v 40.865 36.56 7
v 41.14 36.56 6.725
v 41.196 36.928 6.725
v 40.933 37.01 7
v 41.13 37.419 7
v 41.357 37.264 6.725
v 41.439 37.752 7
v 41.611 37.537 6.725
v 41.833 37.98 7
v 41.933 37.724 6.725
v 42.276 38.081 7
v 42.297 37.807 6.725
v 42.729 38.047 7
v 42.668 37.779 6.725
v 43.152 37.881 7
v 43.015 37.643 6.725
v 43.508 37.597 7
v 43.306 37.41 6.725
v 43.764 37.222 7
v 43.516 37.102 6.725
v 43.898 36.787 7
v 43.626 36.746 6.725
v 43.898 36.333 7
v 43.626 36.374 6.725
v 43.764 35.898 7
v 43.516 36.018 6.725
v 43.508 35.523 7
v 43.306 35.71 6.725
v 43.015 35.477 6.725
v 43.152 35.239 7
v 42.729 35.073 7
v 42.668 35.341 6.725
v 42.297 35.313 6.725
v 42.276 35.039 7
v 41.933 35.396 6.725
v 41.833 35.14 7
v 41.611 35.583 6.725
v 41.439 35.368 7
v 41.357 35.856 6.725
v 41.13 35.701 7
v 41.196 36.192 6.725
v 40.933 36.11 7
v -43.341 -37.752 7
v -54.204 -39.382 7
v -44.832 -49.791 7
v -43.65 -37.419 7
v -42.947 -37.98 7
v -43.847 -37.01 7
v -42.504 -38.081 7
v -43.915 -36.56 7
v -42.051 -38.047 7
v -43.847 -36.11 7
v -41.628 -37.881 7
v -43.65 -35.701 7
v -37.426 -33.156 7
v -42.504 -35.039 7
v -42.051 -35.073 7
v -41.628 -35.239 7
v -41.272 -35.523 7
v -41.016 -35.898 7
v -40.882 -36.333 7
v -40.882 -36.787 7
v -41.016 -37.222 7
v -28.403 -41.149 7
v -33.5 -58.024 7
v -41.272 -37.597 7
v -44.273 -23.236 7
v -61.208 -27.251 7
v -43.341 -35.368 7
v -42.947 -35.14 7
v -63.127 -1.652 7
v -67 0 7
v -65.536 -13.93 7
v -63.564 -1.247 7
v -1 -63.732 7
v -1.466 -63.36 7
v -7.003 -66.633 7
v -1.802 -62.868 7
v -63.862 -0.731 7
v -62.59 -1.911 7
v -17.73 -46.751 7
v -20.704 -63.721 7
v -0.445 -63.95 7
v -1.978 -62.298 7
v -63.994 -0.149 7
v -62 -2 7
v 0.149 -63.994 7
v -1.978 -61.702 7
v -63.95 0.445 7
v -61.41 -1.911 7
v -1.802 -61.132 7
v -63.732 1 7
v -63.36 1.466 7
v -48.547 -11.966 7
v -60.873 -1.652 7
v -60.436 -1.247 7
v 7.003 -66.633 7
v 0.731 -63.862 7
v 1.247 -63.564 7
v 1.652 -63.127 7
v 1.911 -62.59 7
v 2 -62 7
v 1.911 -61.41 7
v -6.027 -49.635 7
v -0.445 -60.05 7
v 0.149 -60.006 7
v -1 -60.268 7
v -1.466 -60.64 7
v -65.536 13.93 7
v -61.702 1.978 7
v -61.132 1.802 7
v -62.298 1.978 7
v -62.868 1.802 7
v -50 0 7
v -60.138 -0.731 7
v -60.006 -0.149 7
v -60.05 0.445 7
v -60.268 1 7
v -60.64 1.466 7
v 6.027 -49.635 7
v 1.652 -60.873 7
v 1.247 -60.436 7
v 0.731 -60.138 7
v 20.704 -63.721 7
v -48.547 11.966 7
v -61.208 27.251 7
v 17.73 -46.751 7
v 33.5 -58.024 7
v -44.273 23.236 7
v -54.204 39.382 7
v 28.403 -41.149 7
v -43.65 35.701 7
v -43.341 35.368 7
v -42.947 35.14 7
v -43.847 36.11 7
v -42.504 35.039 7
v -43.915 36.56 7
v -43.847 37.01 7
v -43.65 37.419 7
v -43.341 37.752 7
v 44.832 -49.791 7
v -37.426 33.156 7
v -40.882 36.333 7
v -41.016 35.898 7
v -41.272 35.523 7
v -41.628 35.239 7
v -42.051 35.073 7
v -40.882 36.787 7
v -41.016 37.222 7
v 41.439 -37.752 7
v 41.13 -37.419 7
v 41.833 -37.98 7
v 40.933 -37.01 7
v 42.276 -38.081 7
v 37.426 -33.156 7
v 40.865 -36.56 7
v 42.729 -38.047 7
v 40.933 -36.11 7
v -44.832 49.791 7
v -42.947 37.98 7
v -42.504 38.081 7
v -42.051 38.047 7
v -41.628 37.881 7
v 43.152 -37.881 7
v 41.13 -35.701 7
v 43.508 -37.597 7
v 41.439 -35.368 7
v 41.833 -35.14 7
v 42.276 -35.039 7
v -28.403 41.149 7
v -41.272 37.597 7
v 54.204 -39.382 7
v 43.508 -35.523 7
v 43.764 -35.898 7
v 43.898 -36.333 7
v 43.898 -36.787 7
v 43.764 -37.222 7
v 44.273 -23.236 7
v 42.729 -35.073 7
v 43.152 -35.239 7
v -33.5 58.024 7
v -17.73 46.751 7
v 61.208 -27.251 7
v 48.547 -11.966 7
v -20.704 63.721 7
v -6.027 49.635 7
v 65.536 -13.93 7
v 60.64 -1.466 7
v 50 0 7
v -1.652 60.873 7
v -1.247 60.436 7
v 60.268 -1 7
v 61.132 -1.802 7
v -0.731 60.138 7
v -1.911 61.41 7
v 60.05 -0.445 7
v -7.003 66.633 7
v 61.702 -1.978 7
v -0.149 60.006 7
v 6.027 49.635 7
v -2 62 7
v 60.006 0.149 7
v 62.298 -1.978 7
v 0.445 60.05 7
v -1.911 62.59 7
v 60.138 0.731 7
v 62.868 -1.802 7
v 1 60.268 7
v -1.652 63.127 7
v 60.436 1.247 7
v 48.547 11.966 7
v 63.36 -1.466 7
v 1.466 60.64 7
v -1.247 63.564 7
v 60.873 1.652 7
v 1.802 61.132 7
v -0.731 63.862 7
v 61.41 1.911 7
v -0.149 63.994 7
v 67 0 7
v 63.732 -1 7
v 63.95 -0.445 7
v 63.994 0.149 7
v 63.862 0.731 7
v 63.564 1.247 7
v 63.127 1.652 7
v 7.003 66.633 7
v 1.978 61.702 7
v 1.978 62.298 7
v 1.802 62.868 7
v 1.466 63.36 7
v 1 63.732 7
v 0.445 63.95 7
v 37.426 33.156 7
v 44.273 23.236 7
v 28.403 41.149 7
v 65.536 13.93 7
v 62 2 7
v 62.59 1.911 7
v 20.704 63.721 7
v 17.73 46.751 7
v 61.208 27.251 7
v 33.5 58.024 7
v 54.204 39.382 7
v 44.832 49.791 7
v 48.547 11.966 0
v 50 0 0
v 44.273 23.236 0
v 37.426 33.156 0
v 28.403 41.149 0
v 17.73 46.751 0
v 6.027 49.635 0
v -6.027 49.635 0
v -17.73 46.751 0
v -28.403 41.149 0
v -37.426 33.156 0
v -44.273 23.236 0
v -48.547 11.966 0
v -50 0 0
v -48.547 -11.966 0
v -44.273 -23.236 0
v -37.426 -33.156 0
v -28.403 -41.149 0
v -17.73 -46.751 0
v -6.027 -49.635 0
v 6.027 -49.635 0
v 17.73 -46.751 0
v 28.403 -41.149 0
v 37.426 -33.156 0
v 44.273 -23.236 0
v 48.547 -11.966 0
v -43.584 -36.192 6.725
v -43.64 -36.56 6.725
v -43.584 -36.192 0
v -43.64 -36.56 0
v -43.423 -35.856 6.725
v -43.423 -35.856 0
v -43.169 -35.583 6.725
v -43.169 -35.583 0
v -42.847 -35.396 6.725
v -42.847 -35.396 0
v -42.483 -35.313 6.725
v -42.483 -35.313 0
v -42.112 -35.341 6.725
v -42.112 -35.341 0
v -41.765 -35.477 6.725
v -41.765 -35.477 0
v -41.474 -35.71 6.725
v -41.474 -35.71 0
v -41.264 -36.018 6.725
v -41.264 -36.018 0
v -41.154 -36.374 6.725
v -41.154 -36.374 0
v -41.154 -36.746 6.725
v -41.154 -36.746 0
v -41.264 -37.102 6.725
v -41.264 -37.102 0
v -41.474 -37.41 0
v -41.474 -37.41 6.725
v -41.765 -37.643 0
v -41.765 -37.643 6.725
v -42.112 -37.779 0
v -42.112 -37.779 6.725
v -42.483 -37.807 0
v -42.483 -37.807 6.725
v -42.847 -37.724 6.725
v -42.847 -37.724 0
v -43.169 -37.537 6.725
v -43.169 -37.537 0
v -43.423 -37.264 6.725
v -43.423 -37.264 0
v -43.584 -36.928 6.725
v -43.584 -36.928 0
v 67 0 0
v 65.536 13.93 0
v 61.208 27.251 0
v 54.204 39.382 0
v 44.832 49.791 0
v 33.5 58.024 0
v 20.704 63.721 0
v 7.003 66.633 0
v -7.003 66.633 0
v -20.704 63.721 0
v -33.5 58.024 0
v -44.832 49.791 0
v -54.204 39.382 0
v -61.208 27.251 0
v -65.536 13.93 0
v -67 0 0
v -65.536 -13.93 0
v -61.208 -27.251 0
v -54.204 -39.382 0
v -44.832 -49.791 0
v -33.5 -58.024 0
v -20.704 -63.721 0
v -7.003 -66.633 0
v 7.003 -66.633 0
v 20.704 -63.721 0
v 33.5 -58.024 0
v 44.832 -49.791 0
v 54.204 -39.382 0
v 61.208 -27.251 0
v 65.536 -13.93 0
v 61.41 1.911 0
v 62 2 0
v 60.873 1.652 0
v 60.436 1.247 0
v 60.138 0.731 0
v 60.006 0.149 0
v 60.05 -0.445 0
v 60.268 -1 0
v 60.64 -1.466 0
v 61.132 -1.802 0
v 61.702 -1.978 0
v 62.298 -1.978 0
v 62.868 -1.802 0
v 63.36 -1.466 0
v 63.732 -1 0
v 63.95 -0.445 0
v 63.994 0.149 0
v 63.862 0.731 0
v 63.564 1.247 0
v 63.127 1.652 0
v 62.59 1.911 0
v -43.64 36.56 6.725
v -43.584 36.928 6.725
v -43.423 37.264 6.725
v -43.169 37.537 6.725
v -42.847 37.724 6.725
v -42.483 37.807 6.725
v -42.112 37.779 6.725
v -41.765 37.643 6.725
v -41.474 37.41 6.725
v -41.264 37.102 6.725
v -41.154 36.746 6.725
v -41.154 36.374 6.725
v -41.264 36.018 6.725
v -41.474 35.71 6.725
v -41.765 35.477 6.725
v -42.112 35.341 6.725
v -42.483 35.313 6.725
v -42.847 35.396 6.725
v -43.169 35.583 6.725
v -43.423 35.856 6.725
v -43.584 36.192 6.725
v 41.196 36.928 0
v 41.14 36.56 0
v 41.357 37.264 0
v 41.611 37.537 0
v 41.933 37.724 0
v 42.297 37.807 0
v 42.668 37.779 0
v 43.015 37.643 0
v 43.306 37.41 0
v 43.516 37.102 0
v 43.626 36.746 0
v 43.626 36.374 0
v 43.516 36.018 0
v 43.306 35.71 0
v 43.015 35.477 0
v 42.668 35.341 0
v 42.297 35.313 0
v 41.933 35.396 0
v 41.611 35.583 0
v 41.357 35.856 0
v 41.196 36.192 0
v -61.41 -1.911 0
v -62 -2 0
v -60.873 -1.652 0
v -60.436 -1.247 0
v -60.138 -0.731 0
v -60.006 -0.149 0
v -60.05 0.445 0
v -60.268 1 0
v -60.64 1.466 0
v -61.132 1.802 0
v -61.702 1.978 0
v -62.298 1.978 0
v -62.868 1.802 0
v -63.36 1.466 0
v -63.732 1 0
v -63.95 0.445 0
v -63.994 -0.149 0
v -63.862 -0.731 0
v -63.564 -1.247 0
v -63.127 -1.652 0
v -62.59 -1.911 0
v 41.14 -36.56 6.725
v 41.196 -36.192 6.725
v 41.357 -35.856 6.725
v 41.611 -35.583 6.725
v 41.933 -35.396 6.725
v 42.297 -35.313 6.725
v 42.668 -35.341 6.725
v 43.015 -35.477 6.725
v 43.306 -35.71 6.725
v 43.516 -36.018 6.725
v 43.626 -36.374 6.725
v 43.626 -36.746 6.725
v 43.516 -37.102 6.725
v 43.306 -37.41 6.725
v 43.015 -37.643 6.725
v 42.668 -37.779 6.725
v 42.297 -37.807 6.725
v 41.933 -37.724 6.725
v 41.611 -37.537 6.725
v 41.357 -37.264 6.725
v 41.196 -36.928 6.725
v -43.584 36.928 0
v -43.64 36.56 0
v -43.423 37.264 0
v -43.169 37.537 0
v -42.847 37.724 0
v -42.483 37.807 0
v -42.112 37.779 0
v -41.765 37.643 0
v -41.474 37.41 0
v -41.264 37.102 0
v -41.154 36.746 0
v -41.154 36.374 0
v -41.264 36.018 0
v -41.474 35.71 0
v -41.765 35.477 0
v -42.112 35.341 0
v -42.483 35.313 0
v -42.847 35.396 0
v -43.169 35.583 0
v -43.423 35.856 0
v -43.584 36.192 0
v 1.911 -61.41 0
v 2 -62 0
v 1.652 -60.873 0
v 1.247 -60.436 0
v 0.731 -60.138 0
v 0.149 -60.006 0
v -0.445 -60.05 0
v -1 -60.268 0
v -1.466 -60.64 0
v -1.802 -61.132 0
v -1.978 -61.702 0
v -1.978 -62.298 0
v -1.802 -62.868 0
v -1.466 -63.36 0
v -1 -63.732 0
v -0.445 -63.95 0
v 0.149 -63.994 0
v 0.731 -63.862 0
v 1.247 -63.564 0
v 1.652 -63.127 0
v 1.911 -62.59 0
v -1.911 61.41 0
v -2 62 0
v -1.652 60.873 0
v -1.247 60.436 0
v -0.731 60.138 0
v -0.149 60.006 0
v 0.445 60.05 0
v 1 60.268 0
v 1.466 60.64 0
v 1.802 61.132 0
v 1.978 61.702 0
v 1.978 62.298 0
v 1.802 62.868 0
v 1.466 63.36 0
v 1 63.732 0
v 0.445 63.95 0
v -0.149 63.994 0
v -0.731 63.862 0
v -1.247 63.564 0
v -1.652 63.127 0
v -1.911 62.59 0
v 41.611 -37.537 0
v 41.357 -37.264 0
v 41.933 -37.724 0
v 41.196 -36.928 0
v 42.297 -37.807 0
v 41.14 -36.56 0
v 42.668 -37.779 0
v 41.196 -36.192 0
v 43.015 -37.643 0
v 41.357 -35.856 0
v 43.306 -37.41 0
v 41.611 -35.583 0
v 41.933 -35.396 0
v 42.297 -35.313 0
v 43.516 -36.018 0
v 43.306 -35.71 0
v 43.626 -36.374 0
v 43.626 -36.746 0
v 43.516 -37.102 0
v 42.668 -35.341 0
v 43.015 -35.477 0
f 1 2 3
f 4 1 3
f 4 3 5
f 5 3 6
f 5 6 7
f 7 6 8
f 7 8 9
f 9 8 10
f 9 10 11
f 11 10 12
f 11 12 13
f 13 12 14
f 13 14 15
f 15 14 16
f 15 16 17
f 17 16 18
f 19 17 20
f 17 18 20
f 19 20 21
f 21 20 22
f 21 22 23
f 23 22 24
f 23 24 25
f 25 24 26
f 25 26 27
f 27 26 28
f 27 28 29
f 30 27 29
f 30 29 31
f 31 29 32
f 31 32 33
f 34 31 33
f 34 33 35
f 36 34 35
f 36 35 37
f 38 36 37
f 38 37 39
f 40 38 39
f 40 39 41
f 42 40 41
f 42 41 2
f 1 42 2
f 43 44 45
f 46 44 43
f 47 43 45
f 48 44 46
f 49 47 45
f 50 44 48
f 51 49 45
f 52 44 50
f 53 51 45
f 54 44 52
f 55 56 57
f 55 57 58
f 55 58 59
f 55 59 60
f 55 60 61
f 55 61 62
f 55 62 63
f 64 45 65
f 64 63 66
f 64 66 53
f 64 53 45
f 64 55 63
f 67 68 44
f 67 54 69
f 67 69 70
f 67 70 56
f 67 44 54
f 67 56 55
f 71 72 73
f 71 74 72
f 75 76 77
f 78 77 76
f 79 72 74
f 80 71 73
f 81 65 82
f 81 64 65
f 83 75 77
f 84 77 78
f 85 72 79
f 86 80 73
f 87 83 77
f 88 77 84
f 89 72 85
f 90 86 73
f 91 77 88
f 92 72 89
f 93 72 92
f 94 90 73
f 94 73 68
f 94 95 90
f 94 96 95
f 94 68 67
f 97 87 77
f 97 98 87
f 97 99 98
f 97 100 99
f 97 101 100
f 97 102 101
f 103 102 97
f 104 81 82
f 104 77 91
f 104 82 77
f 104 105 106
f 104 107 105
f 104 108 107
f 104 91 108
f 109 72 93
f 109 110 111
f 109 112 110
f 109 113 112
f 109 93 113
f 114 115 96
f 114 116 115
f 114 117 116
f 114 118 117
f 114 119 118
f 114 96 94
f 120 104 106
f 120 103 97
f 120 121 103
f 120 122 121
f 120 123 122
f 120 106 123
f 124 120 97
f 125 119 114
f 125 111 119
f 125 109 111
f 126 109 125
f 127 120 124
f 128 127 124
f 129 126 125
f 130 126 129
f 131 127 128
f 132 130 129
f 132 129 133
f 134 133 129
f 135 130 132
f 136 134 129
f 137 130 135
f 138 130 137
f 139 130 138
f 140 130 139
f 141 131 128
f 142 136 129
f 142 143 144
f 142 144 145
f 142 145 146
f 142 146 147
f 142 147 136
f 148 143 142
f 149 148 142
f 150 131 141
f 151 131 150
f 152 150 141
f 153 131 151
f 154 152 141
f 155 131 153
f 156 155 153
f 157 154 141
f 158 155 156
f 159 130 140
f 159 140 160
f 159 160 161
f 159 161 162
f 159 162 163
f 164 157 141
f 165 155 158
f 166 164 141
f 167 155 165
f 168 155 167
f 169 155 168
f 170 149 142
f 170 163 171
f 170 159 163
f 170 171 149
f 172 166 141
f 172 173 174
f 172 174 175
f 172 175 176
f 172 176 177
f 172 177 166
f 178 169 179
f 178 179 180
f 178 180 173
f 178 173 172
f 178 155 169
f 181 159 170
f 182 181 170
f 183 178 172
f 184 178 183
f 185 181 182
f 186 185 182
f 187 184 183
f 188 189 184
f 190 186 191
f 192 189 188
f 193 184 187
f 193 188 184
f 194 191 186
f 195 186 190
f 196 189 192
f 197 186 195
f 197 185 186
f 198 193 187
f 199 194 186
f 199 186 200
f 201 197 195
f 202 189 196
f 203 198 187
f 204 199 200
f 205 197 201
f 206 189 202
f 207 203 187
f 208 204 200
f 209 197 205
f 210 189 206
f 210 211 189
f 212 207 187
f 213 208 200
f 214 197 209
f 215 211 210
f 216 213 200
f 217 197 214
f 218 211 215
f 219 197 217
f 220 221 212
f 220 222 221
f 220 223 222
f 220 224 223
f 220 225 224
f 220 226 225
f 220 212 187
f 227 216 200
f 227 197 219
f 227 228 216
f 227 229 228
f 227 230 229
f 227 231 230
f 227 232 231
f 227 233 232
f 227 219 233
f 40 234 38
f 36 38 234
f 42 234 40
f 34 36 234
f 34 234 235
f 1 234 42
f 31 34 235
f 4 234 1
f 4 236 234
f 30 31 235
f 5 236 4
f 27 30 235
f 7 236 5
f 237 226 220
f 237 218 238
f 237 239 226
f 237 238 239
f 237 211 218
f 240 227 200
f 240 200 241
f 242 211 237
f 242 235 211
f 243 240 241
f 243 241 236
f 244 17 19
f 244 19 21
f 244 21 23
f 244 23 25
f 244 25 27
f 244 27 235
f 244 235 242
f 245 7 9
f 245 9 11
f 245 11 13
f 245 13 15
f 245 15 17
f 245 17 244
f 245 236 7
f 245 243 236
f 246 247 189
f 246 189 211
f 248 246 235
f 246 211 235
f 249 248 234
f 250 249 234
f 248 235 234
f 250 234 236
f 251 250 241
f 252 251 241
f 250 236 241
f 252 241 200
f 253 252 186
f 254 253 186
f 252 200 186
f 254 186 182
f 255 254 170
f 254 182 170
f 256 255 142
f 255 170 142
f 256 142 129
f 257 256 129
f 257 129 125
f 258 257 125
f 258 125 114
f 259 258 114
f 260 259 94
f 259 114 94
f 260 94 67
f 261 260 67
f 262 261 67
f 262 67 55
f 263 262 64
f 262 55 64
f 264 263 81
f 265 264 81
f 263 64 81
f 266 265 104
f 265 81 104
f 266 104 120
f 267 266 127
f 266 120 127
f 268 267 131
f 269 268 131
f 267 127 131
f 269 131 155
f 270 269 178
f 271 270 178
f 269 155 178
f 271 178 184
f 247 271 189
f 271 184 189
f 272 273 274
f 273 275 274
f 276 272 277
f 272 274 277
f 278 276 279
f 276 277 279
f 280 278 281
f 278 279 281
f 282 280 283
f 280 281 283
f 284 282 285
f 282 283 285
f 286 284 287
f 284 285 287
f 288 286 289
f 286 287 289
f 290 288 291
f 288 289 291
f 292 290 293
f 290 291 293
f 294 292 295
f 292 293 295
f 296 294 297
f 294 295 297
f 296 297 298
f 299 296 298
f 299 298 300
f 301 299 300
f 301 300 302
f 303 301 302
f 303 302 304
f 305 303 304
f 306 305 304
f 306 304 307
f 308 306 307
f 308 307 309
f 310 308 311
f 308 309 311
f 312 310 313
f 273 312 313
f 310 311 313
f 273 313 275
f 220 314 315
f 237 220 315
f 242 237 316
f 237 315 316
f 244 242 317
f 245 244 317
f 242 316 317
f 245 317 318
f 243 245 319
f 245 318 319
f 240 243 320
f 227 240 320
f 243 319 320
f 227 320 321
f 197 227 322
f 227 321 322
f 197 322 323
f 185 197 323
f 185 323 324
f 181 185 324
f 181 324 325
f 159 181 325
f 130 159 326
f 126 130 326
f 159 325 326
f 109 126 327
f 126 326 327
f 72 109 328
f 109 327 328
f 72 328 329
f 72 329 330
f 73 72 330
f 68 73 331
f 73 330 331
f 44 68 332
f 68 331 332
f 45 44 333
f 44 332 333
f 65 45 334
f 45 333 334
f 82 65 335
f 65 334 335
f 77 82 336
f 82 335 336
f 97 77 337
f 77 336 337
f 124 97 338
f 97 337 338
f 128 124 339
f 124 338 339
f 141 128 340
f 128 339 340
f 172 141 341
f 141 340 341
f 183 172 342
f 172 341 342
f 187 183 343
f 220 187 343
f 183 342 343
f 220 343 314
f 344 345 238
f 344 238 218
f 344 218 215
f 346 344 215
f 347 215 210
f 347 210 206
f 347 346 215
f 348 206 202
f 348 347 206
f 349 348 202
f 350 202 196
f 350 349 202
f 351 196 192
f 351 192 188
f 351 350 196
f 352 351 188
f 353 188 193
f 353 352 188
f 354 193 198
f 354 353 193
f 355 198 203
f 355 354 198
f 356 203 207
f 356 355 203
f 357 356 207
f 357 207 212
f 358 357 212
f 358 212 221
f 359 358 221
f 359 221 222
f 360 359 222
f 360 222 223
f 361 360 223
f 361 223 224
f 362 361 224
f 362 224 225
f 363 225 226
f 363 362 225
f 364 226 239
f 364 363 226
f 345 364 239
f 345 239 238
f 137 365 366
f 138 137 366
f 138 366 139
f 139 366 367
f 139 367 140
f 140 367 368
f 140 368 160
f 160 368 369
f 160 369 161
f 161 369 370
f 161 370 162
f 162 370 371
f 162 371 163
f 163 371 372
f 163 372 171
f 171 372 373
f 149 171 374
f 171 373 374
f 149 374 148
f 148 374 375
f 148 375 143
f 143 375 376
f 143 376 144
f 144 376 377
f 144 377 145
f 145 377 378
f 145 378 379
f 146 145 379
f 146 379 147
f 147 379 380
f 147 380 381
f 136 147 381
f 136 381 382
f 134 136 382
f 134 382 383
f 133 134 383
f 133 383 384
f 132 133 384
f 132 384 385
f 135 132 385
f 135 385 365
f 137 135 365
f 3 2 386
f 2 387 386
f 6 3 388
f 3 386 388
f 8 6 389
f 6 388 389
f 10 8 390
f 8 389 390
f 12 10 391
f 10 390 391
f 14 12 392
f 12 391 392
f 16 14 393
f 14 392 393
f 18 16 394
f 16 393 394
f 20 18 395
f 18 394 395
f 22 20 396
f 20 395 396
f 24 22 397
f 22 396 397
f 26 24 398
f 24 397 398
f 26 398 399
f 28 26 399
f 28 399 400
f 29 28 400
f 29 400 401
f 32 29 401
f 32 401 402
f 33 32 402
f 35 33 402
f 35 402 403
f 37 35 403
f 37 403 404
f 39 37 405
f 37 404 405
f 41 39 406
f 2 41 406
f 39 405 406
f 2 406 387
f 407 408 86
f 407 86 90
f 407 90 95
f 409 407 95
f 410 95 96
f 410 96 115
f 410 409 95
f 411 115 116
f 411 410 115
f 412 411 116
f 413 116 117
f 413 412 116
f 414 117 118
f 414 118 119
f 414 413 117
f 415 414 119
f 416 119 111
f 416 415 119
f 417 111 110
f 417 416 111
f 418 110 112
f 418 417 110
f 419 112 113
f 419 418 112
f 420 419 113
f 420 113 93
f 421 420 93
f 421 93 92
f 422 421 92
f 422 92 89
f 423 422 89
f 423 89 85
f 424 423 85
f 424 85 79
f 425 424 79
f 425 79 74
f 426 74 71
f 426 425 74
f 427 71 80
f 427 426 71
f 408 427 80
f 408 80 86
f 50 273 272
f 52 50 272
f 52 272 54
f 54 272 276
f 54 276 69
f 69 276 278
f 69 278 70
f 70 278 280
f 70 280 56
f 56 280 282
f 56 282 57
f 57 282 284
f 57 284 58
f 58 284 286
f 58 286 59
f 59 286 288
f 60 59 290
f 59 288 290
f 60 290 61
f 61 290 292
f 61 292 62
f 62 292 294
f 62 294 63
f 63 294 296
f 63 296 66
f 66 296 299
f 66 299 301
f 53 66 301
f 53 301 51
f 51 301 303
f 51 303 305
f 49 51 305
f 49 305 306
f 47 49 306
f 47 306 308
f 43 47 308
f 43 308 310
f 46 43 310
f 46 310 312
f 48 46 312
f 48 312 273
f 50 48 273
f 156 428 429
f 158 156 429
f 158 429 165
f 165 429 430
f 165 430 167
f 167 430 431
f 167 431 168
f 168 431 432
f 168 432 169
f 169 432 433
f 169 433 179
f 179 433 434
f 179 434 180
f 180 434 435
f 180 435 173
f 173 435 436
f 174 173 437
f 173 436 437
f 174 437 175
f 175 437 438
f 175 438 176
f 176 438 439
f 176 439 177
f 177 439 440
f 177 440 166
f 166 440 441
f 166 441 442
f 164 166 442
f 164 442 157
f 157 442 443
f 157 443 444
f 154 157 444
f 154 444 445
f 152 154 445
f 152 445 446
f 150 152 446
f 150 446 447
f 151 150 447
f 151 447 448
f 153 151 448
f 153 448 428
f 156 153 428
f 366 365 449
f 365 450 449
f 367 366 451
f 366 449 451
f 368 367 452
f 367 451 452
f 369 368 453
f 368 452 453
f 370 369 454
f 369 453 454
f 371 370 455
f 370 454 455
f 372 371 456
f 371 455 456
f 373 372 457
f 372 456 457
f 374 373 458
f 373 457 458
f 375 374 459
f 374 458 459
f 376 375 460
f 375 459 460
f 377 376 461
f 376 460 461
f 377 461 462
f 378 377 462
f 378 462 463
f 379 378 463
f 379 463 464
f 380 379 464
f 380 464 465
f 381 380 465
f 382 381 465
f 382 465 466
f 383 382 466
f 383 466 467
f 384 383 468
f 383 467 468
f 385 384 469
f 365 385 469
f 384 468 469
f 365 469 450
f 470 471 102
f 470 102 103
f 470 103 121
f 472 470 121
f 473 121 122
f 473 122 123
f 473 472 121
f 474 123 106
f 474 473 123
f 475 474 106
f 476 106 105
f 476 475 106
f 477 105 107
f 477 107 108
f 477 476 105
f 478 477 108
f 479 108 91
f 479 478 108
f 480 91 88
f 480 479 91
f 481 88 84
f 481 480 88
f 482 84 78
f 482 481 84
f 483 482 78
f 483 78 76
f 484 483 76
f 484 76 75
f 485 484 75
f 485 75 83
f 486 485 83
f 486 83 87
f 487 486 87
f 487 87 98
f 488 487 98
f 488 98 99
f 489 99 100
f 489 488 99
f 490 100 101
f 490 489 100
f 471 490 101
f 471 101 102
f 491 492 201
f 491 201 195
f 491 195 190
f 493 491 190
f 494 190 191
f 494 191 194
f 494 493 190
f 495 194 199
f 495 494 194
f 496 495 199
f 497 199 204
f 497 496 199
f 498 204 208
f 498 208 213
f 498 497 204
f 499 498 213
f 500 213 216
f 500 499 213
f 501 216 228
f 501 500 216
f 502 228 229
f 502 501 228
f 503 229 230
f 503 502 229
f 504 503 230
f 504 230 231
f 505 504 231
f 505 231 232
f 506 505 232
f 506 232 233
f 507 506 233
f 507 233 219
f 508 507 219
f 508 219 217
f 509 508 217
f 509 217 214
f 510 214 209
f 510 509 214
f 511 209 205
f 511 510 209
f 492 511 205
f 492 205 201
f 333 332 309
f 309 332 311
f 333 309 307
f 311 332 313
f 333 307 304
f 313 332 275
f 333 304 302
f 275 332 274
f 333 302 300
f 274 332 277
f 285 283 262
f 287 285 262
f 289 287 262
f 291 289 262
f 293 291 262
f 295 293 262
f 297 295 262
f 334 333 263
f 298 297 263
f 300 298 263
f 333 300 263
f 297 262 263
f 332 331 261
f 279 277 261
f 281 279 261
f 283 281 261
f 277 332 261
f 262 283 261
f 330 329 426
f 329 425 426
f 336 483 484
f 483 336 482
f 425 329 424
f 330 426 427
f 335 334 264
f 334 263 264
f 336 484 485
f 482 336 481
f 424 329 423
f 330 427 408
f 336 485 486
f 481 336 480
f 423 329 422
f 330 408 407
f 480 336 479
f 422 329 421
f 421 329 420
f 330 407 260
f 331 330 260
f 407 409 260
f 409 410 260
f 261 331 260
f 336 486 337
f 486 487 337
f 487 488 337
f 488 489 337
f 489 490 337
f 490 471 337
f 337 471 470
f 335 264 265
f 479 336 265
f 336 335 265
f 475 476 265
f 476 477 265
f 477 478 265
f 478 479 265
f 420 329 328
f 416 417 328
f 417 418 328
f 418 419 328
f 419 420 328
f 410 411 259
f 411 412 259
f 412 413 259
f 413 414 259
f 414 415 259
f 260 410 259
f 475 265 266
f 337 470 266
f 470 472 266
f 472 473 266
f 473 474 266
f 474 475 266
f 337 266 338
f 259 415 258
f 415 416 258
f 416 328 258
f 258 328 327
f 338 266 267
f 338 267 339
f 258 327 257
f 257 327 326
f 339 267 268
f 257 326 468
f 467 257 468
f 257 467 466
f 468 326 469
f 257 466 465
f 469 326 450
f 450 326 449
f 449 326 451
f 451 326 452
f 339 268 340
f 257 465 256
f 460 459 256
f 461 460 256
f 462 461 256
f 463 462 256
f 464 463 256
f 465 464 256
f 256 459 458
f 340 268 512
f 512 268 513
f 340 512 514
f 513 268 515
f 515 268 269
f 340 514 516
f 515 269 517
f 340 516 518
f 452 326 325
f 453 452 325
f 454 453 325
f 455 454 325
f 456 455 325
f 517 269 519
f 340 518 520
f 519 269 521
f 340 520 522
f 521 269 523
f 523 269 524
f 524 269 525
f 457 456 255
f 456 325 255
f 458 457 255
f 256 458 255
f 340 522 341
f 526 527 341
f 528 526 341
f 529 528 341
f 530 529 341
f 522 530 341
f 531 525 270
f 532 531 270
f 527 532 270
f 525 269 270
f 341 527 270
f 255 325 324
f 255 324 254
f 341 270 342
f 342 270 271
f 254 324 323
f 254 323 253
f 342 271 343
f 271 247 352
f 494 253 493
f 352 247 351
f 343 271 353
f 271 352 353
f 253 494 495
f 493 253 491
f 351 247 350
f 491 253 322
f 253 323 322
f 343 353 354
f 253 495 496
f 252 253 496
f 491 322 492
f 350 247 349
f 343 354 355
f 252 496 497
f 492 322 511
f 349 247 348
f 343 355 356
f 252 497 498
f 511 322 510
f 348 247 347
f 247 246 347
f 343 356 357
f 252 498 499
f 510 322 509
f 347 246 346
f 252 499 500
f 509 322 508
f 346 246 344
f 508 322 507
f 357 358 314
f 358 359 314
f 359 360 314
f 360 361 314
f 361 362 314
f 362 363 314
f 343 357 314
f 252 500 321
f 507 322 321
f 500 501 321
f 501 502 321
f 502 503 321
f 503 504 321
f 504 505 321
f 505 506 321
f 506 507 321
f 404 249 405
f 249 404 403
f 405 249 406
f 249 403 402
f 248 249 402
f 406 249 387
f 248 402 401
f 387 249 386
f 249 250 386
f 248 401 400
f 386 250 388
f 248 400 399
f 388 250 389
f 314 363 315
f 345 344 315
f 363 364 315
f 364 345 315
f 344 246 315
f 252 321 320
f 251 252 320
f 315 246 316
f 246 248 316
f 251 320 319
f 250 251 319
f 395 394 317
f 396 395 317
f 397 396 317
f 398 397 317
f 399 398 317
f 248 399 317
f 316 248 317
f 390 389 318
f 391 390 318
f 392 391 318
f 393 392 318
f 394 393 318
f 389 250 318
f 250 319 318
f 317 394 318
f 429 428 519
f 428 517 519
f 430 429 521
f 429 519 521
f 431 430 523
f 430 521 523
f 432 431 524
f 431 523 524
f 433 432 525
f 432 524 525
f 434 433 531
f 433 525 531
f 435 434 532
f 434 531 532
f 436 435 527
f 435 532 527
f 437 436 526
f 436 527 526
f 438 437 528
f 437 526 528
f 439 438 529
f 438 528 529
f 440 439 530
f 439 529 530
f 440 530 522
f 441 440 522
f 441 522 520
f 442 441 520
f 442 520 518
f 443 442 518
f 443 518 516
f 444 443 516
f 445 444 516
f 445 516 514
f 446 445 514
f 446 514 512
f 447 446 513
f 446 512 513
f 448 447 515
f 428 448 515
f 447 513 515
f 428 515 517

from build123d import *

# Parameters (mm, degrees)
SCHIZZO2_R                      = 67
ESTRUSIONE_ESTRUSIONE1_DEPTH    = 7
SCHIZZO3_R                      = 2
TAGLIO_ESTRUSIONE2_DEPTH        = 7
RIPETIZIONECIRCOLARE1_COUNT     = 4
FORO_FILETTATO_M3_1_D           = 2.5
FORO_FILETTATO_M3_1_CSINK_D     = 3.05
FORO_FILETTATO_M3_1_CSINK_ANGLE = 90
SCHIZZO4_R                      = 50
TAGLIO_ESTRUSIONE3_DEPTH        = 7


with BuildPart() as part:
    # Schizzo2 → Estrusione-Estrusione1 (new body)
    with BuildSketch(Plane.XY):
        Circle(SCHIZZO2_R)
    extrude(amount=ESTRUSIONE_ESTRUSIONE1_DEPTH)

    # Schizzo3 → Taglio-Estrusione2 (cut)
    with BuildSketch(Plane.XY):
        with Locations(Location((0, 62, 0), (0, 0, 180))):
            Circle(SCHIZZO3_R)
    taglio_estrusione2 = extrude(amount=TAGLIO_ESTRUSIONE2_DEPTH, mode=Mode.SUBTRACT)

    # RipetizioneCircolare1: Taglio-Estrusione2 ×4 about axis
    ripetizionecircolare1_axis = Axis((0, 0, 0), (0, 0, 1))
    for i in range(1, RIPETIZIONECIRCOLARE1_COUNT):
        add(taglio_estrusione2.rotate(ripetizionecircolare1_axis, i * 360 / RIPETIZIONECIRCOLARE1_COUNT), mode=Mode.SUBTRACT)

    # Foro filettato M3-1 (through all)
    with Locations(Plane(origin=(-42.39, -36.56, 7), x_dir=(1, 0, 0), z_dir=(0, 0, 1))):
        with Locations((0, 0), (84.78, 0), (84.78, 73.12), (0, 73.12)):
            CounterSinkHole(FORO_FILETTATO_M3_1_D / 2, FORO_FILETTATO_M3_1_CSINK_D / 2, counter_sink_angle=FORO_FILETTATO_M3_1_CSINK_ANGLE)

    # Schizzo4 → Taglio-Estrusione3 (cut)
    with BuildSketch(Plane.XY.offset(7)):
        Circle(SCHIZZO4_R)
    extrude(amount=-TAGLIO_ESTRUSIONE3_DEPTH, mode=Mode.SUBTRACT)


solid = part.part
